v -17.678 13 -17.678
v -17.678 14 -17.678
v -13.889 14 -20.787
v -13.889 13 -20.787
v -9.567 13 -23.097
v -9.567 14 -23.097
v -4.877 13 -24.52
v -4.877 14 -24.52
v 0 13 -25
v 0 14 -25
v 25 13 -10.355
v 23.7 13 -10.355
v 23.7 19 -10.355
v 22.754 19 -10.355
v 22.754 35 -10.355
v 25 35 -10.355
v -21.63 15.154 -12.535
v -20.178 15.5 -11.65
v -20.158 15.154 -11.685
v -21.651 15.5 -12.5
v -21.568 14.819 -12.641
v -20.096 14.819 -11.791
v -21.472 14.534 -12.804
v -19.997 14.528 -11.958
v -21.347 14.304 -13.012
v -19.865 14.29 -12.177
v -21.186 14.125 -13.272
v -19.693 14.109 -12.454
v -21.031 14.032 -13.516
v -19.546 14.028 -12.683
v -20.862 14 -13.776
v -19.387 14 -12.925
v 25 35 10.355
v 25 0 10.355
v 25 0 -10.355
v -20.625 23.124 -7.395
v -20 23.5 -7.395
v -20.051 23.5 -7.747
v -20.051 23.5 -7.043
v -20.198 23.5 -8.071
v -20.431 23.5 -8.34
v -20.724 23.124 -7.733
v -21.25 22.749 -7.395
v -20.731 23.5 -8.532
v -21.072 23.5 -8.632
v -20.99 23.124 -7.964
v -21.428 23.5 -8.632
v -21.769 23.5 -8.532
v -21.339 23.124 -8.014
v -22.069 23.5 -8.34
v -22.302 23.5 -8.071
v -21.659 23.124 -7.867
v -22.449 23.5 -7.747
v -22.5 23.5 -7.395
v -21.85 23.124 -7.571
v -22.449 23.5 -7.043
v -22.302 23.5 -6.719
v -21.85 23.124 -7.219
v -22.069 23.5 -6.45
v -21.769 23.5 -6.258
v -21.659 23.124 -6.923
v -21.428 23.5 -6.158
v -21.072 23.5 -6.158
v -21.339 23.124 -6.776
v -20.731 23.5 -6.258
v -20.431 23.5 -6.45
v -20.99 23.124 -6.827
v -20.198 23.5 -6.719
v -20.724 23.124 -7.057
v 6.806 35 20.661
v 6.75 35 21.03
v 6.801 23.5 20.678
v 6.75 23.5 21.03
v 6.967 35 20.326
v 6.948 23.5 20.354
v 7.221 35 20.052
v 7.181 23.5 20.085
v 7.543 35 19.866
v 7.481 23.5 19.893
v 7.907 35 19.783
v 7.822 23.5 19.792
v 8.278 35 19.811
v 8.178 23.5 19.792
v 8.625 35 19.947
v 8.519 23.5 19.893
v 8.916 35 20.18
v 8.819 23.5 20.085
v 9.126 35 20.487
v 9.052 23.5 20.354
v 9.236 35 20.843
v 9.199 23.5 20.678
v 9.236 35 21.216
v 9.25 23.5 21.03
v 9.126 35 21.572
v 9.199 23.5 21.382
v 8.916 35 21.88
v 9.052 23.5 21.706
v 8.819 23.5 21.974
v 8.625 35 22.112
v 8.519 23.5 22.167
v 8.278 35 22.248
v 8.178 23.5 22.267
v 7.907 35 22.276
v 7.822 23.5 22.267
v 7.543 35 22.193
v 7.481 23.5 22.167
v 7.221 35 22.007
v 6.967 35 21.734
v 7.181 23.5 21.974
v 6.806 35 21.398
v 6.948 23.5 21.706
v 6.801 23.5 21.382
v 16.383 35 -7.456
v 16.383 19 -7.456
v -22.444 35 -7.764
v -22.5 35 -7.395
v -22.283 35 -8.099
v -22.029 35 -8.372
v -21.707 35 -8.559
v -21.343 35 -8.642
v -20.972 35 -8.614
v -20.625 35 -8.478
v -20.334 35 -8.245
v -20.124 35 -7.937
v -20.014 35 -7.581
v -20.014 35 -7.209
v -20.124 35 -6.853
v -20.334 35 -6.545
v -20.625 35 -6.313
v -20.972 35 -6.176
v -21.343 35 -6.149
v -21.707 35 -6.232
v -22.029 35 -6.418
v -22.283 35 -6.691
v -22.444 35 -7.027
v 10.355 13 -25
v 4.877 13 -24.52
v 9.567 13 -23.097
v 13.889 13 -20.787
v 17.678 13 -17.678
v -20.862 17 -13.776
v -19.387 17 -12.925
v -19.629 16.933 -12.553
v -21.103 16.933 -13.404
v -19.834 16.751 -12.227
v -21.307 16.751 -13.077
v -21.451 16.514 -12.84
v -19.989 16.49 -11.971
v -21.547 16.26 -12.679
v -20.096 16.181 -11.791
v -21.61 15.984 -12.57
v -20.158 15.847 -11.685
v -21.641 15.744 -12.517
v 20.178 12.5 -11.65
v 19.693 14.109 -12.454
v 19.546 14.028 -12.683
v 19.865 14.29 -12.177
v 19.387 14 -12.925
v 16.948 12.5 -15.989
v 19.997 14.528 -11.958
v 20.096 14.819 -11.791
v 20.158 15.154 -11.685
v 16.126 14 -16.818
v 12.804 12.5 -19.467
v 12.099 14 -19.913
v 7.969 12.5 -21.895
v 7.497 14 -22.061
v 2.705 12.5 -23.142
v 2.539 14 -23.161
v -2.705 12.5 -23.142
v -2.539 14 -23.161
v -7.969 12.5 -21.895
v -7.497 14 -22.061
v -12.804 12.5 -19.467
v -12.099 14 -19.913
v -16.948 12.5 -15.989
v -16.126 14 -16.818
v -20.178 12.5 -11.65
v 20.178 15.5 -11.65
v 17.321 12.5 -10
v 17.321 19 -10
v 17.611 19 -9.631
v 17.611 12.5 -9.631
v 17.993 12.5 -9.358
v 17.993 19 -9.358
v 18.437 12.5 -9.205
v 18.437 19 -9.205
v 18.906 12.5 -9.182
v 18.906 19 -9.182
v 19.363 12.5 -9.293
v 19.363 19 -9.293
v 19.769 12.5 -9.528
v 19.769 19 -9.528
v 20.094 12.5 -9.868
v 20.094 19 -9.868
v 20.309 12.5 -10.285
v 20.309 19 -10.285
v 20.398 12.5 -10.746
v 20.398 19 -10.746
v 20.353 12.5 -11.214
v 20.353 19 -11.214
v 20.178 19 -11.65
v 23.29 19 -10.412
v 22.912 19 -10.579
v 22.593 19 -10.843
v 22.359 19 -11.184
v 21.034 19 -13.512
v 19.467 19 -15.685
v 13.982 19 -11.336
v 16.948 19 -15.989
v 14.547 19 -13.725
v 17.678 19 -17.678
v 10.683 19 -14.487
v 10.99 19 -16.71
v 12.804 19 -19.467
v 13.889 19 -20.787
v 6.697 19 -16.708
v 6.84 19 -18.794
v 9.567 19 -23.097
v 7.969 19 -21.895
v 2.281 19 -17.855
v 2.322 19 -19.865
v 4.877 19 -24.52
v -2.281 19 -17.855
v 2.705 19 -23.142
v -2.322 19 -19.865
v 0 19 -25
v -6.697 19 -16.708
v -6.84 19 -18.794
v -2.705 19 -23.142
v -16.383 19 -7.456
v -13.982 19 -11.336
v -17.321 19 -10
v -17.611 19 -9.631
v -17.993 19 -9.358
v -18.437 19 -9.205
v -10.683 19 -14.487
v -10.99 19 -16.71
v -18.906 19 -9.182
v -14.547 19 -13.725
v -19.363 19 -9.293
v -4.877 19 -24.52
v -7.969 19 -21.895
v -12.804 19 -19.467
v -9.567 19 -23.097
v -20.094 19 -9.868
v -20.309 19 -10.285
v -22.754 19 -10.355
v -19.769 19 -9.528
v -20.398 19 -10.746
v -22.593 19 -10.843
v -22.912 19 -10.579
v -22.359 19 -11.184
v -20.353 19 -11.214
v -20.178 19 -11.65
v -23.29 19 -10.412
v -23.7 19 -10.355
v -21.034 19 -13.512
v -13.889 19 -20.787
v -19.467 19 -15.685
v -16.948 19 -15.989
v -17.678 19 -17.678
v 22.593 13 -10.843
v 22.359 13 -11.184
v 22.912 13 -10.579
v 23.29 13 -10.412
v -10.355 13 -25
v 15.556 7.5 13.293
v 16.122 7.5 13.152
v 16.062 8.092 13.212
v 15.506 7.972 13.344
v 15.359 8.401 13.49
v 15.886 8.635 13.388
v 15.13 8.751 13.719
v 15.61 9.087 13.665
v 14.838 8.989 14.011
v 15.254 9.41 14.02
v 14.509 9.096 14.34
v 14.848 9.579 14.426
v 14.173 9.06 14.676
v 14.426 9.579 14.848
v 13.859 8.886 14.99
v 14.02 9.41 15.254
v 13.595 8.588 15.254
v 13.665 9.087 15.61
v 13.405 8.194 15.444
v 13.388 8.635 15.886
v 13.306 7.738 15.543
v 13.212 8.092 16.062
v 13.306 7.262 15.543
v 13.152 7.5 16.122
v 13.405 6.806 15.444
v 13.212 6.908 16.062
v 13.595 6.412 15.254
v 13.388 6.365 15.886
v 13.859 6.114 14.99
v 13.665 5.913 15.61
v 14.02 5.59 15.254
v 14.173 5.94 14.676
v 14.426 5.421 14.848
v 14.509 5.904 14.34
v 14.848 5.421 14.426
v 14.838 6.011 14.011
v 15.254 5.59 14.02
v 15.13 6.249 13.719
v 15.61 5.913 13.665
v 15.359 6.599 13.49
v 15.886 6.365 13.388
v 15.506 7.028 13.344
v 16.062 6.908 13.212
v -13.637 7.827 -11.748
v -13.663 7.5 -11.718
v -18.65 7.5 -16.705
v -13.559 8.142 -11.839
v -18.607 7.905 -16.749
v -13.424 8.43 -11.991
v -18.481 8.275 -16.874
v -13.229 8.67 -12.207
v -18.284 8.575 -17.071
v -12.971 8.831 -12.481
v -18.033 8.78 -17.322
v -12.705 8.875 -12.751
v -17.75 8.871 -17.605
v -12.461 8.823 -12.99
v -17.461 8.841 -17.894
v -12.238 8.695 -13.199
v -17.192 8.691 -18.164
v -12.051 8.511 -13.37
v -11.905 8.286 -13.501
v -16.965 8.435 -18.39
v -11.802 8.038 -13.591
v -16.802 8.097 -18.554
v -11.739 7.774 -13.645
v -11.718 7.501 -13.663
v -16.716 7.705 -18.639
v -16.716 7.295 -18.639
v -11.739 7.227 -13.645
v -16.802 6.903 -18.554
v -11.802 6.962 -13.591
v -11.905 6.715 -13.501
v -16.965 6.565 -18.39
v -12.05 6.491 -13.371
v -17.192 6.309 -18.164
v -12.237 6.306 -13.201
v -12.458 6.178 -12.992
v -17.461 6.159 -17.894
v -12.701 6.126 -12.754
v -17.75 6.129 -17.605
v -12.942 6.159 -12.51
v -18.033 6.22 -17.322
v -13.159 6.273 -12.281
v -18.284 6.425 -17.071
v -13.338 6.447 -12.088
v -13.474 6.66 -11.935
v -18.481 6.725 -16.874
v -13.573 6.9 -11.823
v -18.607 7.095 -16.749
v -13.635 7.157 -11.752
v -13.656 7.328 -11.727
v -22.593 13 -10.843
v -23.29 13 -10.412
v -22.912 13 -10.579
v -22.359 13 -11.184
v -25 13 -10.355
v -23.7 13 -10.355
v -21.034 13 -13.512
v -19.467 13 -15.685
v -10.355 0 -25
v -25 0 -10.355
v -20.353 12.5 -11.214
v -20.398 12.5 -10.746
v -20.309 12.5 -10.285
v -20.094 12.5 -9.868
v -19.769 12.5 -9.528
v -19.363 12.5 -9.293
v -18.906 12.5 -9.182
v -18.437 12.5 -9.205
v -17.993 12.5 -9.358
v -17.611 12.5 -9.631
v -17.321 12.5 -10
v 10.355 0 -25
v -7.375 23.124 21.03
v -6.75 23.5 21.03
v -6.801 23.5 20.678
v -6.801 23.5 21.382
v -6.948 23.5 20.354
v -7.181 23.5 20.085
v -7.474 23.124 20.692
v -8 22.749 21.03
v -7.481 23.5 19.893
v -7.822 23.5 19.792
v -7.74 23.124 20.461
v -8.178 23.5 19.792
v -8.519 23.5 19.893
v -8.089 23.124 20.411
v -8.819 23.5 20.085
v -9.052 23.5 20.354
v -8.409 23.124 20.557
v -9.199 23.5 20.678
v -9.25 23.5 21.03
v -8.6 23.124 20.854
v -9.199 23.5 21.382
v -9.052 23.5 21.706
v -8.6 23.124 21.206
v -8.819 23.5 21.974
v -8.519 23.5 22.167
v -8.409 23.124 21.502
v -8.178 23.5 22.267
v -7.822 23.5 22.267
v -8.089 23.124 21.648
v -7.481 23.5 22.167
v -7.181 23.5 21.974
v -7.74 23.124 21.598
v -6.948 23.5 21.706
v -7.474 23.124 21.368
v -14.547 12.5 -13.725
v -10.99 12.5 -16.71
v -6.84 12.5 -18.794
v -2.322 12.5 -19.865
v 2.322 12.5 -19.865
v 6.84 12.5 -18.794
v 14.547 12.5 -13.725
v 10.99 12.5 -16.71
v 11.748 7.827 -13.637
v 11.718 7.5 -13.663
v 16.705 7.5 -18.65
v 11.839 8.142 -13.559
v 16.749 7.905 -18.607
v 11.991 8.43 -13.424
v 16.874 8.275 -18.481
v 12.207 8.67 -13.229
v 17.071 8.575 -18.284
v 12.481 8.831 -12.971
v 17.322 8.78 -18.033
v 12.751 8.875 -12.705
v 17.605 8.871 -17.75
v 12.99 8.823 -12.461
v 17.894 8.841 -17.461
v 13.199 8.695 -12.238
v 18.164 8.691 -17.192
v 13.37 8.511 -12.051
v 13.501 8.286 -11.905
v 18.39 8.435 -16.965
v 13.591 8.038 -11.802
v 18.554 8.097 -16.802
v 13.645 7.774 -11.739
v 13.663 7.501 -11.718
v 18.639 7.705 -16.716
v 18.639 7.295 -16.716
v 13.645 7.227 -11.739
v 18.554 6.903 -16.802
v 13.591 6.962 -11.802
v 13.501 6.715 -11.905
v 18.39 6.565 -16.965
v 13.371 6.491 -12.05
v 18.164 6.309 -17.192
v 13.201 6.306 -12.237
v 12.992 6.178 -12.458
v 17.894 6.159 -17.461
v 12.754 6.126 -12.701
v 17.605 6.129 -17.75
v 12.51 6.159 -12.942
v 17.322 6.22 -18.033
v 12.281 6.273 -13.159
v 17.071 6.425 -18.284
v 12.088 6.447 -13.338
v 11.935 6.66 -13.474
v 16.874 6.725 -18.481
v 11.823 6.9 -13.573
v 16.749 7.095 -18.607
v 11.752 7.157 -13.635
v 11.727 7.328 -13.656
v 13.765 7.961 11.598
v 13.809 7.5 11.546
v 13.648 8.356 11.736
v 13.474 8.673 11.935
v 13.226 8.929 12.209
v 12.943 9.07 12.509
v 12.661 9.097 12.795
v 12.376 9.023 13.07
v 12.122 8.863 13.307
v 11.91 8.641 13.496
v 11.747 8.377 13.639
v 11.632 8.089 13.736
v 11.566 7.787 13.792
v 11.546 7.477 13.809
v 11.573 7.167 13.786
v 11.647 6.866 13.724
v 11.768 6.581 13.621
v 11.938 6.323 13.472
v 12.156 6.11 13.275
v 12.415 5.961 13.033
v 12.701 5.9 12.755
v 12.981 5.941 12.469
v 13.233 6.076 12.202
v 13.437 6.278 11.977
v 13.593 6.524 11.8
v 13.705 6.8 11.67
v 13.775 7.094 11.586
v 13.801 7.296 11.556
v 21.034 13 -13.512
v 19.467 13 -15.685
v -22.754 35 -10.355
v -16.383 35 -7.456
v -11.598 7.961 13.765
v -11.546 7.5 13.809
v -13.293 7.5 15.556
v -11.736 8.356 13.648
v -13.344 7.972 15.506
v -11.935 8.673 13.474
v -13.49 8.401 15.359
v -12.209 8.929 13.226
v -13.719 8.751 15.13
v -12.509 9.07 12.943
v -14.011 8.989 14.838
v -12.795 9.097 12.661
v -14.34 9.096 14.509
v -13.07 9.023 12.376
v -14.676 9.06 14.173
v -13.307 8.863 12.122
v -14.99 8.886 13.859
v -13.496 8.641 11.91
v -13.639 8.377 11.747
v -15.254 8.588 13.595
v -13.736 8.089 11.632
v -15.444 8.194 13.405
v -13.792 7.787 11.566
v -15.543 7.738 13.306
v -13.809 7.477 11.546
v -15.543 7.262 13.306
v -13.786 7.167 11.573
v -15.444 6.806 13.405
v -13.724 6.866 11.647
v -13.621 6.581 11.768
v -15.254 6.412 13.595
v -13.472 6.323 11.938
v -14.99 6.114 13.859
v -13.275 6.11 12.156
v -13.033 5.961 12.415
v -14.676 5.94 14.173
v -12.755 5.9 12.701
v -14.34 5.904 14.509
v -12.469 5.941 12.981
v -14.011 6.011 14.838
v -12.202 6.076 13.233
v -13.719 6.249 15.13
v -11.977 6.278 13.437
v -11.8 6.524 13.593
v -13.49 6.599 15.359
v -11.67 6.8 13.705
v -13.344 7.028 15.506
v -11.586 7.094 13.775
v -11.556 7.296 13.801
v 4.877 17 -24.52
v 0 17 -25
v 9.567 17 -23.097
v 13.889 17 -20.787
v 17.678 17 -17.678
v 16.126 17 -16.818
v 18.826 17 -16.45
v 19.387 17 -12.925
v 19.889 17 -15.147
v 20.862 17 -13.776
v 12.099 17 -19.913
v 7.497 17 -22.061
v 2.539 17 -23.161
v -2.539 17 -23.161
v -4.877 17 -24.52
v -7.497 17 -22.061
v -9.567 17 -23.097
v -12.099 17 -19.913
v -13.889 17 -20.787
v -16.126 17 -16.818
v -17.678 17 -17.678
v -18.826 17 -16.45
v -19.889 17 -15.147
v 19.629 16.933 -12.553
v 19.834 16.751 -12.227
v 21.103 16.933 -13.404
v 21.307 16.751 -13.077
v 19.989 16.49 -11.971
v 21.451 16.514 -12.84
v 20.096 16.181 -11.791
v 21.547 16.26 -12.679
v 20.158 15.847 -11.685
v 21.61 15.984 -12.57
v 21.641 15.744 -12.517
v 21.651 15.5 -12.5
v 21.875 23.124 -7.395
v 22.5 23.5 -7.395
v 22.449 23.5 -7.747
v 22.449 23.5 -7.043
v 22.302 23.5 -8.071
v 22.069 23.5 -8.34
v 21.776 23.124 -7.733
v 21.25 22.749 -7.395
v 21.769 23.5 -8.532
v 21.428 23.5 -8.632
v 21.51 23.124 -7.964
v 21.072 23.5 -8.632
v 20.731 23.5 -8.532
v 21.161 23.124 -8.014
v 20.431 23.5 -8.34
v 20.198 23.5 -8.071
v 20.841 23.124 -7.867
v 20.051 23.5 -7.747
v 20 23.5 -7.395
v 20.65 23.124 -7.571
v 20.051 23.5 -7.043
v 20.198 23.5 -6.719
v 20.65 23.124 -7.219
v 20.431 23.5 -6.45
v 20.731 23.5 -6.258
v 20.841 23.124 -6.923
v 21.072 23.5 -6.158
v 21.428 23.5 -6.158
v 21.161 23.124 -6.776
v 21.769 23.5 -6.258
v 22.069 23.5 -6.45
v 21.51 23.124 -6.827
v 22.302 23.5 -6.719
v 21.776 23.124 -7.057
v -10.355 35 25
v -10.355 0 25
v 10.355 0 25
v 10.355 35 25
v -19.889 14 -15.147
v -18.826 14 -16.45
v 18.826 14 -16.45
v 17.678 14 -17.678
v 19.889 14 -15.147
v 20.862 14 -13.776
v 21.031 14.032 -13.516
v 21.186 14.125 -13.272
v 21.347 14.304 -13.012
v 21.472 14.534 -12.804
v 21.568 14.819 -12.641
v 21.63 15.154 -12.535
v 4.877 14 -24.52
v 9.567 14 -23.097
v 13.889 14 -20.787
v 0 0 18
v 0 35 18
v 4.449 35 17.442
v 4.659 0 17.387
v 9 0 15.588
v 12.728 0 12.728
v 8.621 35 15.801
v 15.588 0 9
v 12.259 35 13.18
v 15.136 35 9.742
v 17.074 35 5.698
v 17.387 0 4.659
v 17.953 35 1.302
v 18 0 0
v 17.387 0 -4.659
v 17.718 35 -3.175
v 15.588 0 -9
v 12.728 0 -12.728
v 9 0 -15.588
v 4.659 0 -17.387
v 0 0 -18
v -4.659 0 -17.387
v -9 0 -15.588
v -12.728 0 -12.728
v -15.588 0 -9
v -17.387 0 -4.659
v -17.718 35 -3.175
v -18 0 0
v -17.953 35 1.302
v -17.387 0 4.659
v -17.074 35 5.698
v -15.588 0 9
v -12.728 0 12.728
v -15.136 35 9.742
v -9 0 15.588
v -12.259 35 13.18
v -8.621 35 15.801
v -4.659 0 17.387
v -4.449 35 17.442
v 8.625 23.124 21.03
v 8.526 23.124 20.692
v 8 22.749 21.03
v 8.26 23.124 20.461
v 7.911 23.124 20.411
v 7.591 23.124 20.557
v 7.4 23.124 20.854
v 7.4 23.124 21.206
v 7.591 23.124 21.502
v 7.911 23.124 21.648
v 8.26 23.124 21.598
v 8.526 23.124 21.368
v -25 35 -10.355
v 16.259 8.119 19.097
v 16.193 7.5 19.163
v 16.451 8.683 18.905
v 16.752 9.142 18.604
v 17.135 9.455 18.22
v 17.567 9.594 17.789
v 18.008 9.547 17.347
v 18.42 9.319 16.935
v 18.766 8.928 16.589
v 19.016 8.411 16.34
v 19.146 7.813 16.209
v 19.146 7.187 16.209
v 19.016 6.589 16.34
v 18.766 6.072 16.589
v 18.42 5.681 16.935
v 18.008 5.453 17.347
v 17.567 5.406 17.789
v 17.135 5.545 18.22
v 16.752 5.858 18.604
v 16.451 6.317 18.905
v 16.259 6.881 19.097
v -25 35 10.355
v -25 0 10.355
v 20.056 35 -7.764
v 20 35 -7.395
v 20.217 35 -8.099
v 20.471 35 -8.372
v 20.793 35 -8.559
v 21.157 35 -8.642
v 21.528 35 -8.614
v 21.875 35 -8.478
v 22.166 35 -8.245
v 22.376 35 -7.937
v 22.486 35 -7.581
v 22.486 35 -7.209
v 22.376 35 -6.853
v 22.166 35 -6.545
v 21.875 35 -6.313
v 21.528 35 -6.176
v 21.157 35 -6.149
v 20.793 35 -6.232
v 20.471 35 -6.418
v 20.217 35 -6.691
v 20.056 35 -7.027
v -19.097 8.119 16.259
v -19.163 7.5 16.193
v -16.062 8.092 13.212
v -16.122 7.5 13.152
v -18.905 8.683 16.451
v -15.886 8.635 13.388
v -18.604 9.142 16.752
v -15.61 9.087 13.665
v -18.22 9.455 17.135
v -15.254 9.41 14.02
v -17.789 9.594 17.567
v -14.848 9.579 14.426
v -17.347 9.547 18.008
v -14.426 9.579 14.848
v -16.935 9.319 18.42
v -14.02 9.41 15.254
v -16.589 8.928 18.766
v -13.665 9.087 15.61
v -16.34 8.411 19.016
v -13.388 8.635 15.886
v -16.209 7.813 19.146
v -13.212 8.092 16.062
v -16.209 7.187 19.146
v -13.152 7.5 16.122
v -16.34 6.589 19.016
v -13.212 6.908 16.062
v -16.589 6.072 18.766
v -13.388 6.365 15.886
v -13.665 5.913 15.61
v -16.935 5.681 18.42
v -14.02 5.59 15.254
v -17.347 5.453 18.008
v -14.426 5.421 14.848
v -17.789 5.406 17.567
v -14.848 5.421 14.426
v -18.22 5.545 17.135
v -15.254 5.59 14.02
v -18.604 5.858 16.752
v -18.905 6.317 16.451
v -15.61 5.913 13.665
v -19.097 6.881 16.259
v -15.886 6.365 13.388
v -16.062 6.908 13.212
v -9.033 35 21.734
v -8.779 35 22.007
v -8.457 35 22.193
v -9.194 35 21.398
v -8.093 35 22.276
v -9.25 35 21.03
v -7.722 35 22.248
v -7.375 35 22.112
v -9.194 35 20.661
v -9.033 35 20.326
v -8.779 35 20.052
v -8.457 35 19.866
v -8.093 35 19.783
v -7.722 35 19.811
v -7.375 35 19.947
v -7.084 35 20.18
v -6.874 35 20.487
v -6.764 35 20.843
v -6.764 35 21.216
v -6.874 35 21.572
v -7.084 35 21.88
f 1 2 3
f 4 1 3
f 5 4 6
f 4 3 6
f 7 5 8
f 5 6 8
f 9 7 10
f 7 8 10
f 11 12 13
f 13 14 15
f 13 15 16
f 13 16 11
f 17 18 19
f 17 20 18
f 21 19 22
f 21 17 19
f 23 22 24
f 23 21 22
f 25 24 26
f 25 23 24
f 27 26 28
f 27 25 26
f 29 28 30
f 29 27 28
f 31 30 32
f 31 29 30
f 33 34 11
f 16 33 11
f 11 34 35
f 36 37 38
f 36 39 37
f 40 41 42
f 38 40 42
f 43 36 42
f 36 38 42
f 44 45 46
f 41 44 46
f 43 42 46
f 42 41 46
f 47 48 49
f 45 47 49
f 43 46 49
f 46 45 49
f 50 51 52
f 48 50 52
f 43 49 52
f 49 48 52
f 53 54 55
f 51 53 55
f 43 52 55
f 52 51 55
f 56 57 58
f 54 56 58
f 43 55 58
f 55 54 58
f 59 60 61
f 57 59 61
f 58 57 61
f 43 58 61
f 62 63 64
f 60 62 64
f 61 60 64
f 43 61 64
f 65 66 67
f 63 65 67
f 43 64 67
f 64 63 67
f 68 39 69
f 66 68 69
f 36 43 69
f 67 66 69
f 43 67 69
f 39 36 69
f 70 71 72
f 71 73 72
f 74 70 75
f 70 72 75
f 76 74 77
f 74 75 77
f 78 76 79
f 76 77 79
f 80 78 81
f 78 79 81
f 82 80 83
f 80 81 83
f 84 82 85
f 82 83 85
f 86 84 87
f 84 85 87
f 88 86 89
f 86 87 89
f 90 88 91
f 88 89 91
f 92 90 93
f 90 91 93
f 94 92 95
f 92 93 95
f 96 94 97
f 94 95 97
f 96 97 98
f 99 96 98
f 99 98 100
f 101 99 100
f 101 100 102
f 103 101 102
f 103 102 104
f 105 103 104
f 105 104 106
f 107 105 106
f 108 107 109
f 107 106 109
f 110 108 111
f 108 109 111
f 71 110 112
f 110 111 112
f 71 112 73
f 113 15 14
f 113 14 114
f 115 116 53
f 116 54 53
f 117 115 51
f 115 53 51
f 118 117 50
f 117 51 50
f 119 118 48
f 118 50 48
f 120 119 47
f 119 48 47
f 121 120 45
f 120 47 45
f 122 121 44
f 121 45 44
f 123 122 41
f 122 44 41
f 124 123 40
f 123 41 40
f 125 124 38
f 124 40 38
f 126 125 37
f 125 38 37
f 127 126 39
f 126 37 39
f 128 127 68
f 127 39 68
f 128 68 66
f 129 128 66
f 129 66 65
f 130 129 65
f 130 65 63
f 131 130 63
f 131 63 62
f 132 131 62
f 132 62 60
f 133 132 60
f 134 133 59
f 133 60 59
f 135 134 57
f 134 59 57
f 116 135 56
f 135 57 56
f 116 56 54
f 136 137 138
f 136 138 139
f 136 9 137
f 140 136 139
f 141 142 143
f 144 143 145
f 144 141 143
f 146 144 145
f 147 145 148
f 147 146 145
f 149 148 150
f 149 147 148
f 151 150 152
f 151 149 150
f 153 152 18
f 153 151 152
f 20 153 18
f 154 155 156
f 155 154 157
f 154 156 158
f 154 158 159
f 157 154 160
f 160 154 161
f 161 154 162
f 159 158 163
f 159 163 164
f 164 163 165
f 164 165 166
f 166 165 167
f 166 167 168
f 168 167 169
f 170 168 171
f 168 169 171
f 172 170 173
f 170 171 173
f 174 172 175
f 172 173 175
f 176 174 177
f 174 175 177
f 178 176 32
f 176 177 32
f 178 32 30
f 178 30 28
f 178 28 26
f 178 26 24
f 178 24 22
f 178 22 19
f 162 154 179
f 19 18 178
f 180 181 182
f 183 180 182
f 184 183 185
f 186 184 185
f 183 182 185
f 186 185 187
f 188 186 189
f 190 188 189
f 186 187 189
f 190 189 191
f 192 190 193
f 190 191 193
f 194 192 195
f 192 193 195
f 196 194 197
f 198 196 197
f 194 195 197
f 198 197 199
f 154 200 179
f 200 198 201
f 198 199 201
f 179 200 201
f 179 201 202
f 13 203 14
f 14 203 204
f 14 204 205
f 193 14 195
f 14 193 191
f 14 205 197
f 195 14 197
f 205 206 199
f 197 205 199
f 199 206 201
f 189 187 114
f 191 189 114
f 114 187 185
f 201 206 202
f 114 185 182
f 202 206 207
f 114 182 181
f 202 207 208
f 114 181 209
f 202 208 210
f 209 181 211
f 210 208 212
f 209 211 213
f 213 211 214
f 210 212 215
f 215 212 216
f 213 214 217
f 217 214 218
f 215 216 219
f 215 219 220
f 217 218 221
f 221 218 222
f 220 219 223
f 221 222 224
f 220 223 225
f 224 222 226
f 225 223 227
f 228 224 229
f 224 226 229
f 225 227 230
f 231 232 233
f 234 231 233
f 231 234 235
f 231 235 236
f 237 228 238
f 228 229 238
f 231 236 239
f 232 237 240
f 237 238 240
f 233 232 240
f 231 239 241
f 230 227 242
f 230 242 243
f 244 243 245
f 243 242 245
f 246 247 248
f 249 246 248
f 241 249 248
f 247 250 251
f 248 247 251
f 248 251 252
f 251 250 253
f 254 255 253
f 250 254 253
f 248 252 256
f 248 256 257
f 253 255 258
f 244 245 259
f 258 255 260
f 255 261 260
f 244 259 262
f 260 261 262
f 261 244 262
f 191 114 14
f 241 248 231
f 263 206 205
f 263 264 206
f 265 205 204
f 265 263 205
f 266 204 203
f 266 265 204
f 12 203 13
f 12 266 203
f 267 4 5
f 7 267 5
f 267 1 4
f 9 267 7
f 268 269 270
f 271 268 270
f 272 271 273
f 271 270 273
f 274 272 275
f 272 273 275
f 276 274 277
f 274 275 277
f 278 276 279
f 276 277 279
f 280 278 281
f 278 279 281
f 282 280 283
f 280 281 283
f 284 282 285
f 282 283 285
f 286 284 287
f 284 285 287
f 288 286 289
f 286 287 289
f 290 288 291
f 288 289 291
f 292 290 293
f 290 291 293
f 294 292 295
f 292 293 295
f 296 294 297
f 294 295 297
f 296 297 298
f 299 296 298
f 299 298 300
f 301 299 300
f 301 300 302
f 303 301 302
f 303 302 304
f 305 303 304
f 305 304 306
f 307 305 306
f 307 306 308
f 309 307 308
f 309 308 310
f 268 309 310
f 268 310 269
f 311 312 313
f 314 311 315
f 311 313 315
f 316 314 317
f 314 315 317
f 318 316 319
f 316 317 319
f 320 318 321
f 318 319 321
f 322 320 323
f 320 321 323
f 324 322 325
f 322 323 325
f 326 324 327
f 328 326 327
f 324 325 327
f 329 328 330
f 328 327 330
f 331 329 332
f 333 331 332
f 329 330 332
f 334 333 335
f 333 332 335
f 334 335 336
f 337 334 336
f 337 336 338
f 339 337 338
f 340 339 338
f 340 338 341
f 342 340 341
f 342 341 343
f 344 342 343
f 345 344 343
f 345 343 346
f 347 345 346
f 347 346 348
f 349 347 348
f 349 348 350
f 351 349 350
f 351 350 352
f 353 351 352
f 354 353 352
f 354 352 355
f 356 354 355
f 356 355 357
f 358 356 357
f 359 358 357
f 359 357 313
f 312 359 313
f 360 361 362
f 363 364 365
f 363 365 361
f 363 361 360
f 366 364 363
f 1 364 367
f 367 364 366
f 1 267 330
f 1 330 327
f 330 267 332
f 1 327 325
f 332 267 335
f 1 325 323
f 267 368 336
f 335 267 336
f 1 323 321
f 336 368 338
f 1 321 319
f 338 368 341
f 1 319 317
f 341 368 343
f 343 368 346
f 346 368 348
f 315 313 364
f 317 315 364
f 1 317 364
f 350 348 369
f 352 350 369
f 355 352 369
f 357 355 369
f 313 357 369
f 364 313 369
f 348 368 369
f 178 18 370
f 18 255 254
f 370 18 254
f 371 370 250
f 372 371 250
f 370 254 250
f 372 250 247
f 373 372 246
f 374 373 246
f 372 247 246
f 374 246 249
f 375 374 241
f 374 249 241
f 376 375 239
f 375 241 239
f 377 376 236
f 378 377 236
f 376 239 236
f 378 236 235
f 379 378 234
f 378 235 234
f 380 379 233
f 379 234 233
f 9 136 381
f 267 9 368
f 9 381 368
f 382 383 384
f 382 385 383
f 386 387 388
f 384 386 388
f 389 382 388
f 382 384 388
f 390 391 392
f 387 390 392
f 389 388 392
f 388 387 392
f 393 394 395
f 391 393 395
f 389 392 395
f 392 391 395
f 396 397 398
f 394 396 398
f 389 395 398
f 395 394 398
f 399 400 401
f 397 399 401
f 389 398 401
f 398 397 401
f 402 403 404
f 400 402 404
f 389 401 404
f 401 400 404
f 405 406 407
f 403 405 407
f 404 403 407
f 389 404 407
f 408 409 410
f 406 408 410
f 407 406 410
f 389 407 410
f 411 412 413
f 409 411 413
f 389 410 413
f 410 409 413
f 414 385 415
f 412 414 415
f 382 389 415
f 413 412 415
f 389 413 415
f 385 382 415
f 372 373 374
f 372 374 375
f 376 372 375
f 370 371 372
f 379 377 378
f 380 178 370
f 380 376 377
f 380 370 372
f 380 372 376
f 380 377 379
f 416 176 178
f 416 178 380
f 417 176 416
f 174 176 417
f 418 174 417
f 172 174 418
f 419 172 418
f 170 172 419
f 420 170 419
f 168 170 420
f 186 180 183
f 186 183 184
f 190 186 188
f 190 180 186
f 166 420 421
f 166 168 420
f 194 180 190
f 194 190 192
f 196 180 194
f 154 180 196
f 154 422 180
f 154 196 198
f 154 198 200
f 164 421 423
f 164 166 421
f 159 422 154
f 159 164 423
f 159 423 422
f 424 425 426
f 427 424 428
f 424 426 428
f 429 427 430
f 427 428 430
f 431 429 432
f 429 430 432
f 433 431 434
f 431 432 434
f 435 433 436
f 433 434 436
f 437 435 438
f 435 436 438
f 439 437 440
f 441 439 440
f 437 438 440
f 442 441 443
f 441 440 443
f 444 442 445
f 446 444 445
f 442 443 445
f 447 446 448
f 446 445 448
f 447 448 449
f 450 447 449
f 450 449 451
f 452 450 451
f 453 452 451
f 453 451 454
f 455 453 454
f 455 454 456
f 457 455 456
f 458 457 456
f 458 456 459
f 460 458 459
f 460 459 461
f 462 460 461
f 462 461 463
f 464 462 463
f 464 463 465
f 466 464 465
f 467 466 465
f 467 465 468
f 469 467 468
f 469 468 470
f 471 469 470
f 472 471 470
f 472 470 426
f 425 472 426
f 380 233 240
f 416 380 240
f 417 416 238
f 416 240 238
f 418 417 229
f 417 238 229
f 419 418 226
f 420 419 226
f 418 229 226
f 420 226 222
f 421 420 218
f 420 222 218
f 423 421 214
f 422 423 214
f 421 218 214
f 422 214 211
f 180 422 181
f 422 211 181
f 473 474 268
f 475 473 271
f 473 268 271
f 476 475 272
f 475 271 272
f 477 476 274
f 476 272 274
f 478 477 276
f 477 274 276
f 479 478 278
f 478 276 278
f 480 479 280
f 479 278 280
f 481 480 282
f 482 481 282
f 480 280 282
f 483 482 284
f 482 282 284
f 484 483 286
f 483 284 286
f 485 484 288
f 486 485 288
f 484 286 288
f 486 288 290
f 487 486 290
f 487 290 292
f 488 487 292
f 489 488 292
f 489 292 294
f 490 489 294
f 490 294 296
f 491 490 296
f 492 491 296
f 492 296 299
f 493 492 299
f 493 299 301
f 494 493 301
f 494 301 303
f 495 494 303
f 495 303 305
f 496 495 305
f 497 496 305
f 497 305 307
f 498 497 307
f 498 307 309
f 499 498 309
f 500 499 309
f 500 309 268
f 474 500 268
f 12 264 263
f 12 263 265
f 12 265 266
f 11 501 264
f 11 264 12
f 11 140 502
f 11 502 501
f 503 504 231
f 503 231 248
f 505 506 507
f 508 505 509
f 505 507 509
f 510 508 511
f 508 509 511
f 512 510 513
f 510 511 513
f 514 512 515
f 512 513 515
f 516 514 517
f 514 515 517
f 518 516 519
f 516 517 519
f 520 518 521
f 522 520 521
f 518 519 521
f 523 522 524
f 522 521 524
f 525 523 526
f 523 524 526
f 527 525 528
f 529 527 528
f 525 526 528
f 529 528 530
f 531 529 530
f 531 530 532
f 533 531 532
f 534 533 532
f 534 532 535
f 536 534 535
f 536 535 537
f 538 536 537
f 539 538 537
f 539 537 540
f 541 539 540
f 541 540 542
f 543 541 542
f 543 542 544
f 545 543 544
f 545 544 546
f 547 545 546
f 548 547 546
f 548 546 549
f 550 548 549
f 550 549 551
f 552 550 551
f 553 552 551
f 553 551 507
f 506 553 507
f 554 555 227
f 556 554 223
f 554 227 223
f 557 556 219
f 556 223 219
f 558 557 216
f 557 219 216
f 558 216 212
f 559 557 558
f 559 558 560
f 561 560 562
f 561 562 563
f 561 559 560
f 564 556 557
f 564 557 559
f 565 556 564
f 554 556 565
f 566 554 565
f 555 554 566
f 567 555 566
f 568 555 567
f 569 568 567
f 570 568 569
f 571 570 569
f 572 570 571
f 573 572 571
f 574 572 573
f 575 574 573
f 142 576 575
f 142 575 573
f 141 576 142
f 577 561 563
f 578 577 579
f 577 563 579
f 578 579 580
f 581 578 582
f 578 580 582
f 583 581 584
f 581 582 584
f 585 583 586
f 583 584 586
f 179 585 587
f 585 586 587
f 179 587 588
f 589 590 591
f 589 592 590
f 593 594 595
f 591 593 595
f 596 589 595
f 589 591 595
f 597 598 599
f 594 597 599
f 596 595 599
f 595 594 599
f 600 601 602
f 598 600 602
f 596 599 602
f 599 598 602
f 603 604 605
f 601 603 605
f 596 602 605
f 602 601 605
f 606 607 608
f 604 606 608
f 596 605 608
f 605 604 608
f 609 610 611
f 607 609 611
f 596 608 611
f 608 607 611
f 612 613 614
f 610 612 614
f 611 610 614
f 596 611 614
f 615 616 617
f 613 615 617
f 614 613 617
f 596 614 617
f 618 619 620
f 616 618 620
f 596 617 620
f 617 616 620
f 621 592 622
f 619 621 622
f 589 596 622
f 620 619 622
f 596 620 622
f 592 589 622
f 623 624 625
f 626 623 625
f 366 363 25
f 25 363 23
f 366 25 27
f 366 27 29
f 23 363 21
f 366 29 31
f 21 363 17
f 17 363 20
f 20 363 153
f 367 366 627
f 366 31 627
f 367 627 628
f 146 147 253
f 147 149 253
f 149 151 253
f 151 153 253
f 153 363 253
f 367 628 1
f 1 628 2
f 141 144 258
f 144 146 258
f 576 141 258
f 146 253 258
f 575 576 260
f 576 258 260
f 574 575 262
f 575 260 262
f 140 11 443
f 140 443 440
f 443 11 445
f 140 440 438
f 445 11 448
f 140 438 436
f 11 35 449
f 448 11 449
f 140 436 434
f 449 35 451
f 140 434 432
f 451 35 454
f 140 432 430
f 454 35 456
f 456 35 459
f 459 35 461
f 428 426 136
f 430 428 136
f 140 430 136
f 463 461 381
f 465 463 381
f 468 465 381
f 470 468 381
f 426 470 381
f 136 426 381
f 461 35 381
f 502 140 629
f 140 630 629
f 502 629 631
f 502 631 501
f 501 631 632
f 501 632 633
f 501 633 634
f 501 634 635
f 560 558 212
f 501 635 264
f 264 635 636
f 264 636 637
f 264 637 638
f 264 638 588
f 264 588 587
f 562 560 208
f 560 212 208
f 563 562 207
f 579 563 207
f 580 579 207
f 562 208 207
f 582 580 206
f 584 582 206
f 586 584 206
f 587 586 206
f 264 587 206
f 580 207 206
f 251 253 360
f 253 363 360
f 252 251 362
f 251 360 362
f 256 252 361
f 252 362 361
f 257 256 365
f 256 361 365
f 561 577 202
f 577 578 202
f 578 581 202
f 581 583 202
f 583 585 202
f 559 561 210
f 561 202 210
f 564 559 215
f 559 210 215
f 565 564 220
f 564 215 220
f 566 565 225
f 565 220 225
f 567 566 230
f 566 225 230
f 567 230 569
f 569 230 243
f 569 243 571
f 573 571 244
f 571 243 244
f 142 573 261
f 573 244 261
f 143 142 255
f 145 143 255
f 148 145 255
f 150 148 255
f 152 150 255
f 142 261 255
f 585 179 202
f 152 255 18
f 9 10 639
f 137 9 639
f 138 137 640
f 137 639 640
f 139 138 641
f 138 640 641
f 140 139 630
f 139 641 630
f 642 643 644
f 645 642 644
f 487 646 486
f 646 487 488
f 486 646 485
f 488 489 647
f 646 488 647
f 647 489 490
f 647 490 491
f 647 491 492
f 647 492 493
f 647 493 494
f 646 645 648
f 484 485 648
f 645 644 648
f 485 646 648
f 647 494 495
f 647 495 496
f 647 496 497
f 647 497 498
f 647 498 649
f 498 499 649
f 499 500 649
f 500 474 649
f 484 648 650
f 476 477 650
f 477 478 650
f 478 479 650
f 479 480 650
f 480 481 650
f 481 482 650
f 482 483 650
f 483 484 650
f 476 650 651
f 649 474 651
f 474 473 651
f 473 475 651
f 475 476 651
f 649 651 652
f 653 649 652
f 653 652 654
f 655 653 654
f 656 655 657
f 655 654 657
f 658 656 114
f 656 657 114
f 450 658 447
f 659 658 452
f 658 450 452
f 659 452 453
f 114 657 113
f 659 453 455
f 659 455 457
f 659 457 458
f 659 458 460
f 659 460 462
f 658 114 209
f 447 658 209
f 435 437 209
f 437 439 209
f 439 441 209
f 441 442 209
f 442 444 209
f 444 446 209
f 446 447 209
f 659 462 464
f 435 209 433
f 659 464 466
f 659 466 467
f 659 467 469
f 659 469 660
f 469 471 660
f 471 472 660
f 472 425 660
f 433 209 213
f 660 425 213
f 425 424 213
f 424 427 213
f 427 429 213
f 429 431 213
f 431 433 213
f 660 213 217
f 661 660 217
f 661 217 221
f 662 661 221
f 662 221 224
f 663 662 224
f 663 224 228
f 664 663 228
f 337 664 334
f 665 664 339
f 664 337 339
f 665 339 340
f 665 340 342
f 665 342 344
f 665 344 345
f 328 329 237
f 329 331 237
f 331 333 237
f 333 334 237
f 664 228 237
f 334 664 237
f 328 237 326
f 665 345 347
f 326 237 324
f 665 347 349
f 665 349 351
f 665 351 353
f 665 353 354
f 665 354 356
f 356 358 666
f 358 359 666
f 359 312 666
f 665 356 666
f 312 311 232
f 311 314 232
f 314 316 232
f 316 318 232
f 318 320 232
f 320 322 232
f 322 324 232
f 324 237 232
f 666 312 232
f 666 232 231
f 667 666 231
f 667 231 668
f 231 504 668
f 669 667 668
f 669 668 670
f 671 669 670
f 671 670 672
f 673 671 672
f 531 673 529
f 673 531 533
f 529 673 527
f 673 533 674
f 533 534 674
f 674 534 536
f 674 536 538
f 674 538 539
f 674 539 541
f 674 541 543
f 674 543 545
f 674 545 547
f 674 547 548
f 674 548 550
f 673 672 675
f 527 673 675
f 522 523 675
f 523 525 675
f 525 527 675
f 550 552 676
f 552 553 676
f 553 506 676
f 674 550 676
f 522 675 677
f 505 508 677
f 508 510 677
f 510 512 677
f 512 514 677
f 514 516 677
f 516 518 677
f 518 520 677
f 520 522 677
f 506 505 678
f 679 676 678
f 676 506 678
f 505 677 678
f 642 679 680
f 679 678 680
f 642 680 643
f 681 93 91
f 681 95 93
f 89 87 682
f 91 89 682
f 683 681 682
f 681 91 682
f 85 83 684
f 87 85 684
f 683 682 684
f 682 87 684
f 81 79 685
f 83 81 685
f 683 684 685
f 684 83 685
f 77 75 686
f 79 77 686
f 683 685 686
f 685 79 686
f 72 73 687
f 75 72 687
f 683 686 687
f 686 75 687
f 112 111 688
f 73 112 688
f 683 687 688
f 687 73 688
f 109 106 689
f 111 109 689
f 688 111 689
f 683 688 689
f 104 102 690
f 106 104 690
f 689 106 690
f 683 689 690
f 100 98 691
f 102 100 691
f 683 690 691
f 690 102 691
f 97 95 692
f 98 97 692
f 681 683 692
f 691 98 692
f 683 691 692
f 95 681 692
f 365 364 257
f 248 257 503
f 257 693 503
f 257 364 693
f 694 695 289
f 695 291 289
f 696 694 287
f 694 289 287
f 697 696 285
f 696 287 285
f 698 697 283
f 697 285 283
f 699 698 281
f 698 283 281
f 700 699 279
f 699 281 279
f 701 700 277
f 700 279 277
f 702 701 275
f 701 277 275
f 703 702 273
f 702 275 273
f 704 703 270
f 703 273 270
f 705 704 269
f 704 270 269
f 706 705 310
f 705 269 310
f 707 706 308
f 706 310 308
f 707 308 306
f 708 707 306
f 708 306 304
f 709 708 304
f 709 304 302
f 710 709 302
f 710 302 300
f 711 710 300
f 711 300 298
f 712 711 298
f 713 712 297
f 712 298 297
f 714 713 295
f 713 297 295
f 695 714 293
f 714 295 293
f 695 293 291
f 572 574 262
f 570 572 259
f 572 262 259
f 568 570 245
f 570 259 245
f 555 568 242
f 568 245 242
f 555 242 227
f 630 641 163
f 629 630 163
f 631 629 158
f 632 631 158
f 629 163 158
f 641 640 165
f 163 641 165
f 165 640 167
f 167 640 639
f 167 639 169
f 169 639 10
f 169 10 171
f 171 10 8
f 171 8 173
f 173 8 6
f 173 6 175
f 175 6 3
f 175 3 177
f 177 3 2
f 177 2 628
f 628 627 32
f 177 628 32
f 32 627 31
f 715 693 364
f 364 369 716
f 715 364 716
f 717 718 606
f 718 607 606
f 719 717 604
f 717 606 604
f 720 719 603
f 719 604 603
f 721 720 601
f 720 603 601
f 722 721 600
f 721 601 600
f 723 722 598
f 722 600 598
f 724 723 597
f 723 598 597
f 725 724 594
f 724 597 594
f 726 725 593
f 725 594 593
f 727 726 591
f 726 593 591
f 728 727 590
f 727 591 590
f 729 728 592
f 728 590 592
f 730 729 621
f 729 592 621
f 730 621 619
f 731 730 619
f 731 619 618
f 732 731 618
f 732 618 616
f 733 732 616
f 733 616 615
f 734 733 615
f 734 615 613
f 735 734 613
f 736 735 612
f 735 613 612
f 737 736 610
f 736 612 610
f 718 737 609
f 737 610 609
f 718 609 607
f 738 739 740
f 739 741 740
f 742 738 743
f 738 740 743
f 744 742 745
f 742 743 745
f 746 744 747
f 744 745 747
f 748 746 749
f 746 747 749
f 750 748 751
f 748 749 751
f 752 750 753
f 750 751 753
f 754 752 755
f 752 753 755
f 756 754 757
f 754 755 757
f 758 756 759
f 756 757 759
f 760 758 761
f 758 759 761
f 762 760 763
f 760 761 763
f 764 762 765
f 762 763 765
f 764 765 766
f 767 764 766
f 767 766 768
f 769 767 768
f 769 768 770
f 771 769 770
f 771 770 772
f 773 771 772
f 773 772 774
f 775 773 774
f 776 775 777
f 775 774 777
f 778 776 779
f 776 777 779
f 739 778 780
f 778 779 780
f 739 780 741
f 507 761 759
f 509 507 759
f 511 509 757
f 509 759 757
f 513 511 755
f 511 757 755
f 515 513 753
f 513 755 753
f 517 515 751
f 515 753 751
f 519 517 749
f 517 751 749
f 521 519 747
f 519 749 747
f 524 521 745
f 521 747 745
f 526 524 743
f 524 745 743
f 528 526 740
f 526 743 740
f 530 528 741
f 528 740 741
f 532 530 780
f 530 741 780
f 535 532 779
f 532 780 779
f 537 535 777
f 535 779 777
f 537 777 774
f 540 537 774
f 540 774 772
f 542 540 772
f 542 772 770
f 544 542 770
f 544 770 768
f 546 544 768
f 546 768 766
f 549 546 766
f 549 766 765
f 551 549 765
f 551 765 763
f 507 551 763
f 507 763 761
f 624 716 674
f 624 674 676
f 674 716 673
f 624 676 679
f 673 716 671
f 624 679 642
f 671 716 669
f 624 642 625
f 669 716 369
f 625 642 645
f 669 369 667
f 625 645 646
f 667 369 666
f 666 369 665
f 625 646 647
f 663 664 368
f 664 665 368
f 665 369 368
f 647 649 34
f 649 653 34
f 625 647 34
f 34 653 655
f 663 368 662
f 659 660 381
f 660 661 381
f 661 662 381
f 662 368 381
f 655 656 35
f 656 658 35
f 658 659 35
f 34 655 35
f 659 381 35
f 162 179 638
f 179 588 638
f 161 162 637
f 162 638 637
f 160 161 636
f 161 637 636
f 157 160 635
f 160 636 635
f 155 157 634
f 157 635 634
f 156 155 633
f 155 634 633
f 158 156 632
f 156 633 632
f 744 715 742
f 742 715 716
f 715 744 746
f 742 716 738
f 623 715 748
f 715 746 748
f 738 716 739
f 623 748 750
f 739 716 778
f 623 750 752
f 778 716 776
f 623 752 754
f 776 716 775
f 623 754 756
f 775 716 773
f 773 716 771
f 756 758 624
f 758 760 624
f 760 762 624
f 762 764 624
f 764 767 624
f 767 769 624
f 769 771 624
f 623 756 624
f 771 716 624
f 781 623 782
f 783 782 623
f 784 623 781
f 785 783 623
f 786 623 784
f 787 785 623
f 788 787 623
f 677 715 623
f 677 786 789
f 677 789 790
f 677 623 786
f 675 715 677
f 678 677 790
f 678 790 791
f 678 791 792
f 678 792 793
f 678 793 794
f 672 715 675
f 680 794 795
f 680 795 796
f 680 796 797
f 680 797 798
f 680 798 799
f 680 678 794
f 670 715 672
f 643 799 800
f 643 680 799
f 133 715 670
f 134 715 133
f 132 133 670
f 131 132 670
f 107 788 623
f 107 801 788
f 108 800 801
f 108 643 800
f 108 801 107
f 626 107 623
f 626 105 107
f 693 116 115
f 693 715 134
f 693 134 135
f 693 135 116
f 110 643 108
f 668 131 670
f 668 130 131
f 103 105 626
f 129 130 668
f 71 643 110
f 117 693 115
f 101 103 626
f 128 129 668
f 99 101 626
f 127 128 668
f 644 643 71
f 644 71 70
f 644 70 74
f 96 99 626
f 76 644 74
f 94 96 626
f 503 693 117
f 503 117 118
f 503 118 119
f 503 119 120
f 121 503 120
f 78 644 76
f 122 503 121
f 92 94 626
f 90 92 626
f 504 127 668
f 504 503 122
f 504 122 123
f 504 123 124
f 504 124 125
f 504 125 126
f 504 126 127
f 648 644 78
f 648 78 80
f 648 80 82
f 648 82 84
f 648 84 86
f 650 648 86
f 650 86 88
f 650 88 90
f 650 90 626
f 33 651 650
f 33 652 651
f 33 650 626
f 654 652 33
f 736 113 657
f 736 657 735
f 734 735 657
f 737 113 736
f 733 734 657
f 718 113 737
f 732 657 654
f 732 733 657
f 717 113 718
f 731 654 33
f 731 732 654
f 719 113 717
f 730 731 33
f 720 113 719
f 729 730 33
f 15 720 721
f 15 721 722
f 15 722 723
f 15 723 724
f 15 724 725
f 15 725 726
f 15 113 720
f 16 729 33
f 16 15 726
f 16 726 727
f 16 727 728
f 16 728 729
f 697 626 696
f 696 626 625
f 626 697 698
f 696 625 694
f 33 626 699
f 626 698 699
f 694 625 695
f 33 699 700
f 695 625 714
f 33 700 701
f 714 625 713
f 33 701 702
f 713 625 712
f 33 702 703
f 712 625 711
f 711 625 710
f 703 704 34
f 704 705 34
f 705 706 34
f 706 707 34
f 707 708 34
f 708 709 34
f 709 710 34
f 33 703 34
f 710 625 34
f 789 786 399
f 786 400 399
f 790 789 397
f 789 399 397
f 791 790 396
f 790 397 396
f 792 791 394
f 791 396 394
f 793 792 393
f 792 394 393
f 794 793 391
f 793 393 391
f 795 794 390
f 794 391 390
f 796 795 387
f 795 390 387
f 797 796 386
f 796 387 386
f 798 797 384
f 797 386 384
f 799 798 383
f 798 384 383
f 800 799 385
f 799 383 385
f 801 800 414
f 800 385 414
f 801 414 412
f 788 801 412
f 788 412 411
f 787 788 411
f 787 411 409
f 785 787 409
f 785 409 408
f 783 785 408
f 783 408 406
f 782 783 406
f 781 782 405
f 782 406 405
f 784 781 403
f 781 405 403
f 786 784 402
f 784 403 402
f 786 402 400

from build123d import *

# Parameters (mm, degrees)
BOSS_EXTRUDE1_DEPTH         = 35
CUT_EXTRUDE1_REACH          = 51.749
SKETCH2_R                   = 18
CUT_EXTRUDE2_DEPTH          = 22
CUT_EXTRUDE3_DEPTH          = 16
SKETCH5_W                   = 4.5
SKETCH5_H                   = 3
CUT_REVOLVE1_ANGLE          = 120
FILLET2_R                   = 1.5
CUT_EXTRUDE7_DEPTH          = 6.5
M3X0_25_TAPPED_HOLE1_REACH  = 71.769
M3X0_25_TAPPED_HOLE1_BORE_R = 1.375
M3X0_25_TAPPED_HOLE2_REACH  = 71.769
M3X0_25_TAPPED_HOLE2_BORE_R = 1.375
CUT_EXTRUDE8_REACH          = 71.769
CUT_EXTRUDE8_END_RADIUS     = 18
SKETCH15_R                  = 1.6
CUT_EXTRUDE9_REACH          = 71.769
CUT_EXTRUDE9_END_RADIUS     = 18
SKETCH16_R                  = 1.6
M5_TAPPED_HOLE3_D           = 4.2
M5_TAPPED_HOLE3_DEPTH       = 4.3
M5_TAPPED_HOLE3_TIP         = 1.2618073
M5_TAPPED_HOLE4_D           = 4.2
M5_TAPPED_HOLE4_DEPTH       = 4.3
M5_TAPPED_HOLE4_TIP         = 1.2618073
M3_TAPPED_HOLE1_D           = 2.5
M3_TAPPED_HOLE1_DEPTH       = 11.5
M3_TAPPED_HOLE1_TIP         = 0.751075774
FILLET3_R                   = 1.5


with BuildPart() as part:
    # Sketch1 → Boss-Extrude1 (new body)
    with BuildSketch(Plane(origin=(0, 0, 0), x_dir=(1, 0, 0), z_dir=(0, 1, 0))):
        Polygon((10.355339059, 25), (-10.355339059, 25), (-25, 10.355339059), (-25, -10.355339059), (-10.355339059, -25), (10.355339059, -25), (25, -10.355339059), (25, 10.355339059), align=None)
    extrude(amount=BOSS_EXTRUDE1_DEPTH)

    # Sketch2 → Cut-Extrude1 (cut, up to next)
    with BuildSketch(Plane(origin=(0, 35, 0), x_dir=(1, 0, 0), z_dir=(0, 1, 0)), mode=Mode.PRIVATE) as cut_extrude1_sk1:
        with Locations(Location((0, 0, 0), (0, 0, 270))):
            Circle(SKETCH2_R)
    cut_extrude1_tool1 = extrude(cut_extrude1_sk1.sketch, amount=-CUT_EXTRUDE1_REACH, mode=Mode.PRIVATE) & part.part
    add(cut_extrude1_tool1.solids().sort_by_distance((0, 35, 0))[0], mode=Mode.SUBTRACT)

    # Sketch3 → Cut-Extrude2 (cut)
    with BuildSketch(Plane(origin=(0, 35, 0), x_dir=(1, 0, 0), z_dir=(0, 1, 0))):
        with BuildLine():
            Line((-10.355339059, 25), (-17.677669284, 17.677669776))
            ThreePointArc((-17.677669284, 17.677669776), (-9.567085631, 23.096988387), (3.8e-08, 25))
            Line((3.8e-08, 25), (-10.355339059, 25))
        make_face()
        with BuildLine():
            Line((-17.677669284, 17.677669776), (-25, 10.355339059))
            Line((-25, 10.355339059), (-22.754493028, 10.355339059))
            ThreePointArc((-22.754493028, 10.355339059), (-20.544928062, 14.244505289), (-17.677669284, 17.677669776))
        make_face()
        with BuildLine():
            Line((10.355339059, 25), (3.8e-08, 25))
            ThreePointArc((3.8e-08, 25), (9.56708591, 23.096988271), (17.677669657, 17.677669402))
            Line((17.677669657, 17.677669402), (10.355339059, 25))
        make_face()
        with BuildLine():
            Line((25, 10.355339059), (17.677669657, 17.677669402))
            ThreePointArc((17.677669657, 17.677669402), (20.544928213, 14.244505072), (22.754493028, 10.355339059))
            Line((22.754493028, 10.355339059), (25, 10.355339059))
        make_face()
    extrude(amount=-CUT_EXTRUDE2_DEPTH, mode=Mode.SUBTRACT)

    # Sketch4 → Cut-Extrude3 (cut)
    with BuildSketch(Plane(origin=(0, 35, 0), x_dir=(1, 0, 0), z_dir=(0, 1, 0))):
        with BuildLine():
            Line((-16.38323498, 7.455844123), (-22.754493028, 10.355339059))
            ThreePointArc((-22.754493028, 10.355339059), (0, 25), (22.754493028, 10.355339059))
            Line((22.754493028, 10.355339059), (16.38323498, 7.455844123))
            ThreePointArc((16.38323498, 7.455844123), (0, 18), (-16.38323498, 7.455844123))
        make_face()
    extrude(amount=-CUT_EXTRUDE3_DEPTH, mode=Mode.SUBTRACT)

    # Sketch5 → Cut-Revolve1 (revolve, symmetric, cut)
    with BuildSketch(Plane(origin=(0, 0, 0), x_dir=(0, 0, -1), z_dir=(1, 0, 0))) as cut_revolve1_sk:
        with Locations((22.75, 15.5)):
            Rectangle(SKETCH5_W, SKETCH5_H)
    revolve(axis=Axis((0, 0, 0), (0, 1, 0)), revolution_arc=CUT_REVOLVE1_ANGLE / 2, mode=Mode.SUBTRACT)
    revolve(cut_revolve1_sk.sketch, axis=Axis((0, 0, 0), (0, -1, 0)), revolution_arc=CUT_REVOLVE1_ANGLE / 2, mode=Mode.SUBTRACT)

    # Fillet2
    fillet2_edges = [part.edges().sort_by_distance(p)[0] for p in [
        (19.702077936, 14, -11.375),
        (19.702077936, 17, -11.375),
        (-19.702077936, 17, -11.375),
        (-19.702077936, 14, -11.375),
    ]]
    fillet(fillet2_edges, radius=FILLET2_R - 0.0001)  # a hair under: the kernel refuses the full size

    # Sketch9 → Cut-Extrude7 (cut)
    with BuildSketch(Plane(origin=(0, 19, 0), x_dir=(1, 0, 0), z_dir=(0, 1, 0))):
        with BuildLine():
            ThreePointArc((20.178391908, 11.65), (0, 23.3), (-20.178391908, 11.65))
            ThreePointArc((-20.178391908, 11.65), (-19.574449992, 9.396058084), (-17.320508076, 10))
            ThreePointArc((-17.320508076, 10), (0, 20), (17.320508076, 10))
            ThreePointArc((17.320508076, 10), (19.574449992, 9.396058084), (20.178391908, 11.65))
        make_face()
    extrude(amount=-CUT_EXTRUDE7_DEPTH, mode=Mode.SUBTRACT)

    # M3x0.25 Tapped Hole1 bore → M3x0.25 Tapped Hole1 (cut, up to next)
    with BuildSketch(Plane(origin=(-17.67766953, 0, -17.67766953), x_dir=(-0.7071067811865472, 0, 0.7071067811865479), z_dir=(-0.7071067811865479, 0, -0.7071067811865472)), mode=Mode.PRIVATE) as m3x0_25_tapped_hole1_sk1:
        with Locations((0, 7.5)):
            Circle(M3X0_25_TAPPED_HOLE1_BORE_R)
    m3x0_25_tapped_hole1_tool1 = extrude(m3x0_25_tapped_hole1_sk1.sketch, amount=-M3X0_25_TAPPED_HOLE1_REACH, mode=Mode.PRIVATE) & part.part
    add(m3x0_25_tapped_hole1_tool1.solids().sort_by_distance((-17.67767, 7.5, -17.67767))[0], mode=Mode.SUBTRACT)

    # M3x0.25 Tapped Hole2 bore → M3x0.25 Tapped Hole2 (cut, up to next)
    with BuildSketch(Plane(origin=(17.67766953, 0, -17.67766953), x_dir=(-0.7071067811865475, 0, -0.7071067811865477), z_dir=(0.7071067811865477, 0, -0.7071067811865475)), mode=Mode.PRIVATE) as m3x0_25_tapped_hole2_sk1:
        with Locations((0, 7.5)):
            Circle(M3X0_25_TAPPED_HOLE2_BORE_R)
    m3x0_25_tapped_hole2_tool1 = extrude(m3x0_25_tapped_hole2_sk1.sketch, amount=-M3X0_25_TAPPED_HOLE2_REACH, mode=Mode.PRIVATE) & part.part
    add(m3x0_25_tapped_hole2_tool1.solids().sort_by_distance((17.67767, 7.5, -17.67767))[0], mode=Mode.SUBTRACT)

    # Cut-Extrude8: up to this cylinder (the profile starts outside it)
    cut_extrude8_end = Plane(origin=(0, 7.5, 0), z_dir=(0, 1, 0)) * Cylinder(CUT_EXTRUDE8_END_RADIUS, 180.538, mode=Mode.PRIVATE)
    # Sketch15 → Cut-Extrude8 (cut, up to the surface)
    with BuildSketch(Plane(origin=(17.67766953, 0, 17.67766953), x_dir=(0.7071067811865472, 0, -0.7071067811865479), z_dir=(0.7071067811865479, 0, 0.7071067811865472)), mode=Mode.PRIVATE) as cut_extrude8_sk1:
        with Locations((0, 7.5)):
            Circle(SKETCH15_R)
    cut_extrude8_tool1 = extrude(cut_extrude8_sk1.sketch, amount=-CUT_EXTRUDE8_REACH, mode=Mode.PRIVATE) - cut_extrude8_end
    add(cut_extrude8_tool1.solids().sort_by_distance((17.67767, 7.5, 17.67767))[0], mode=Mode.SUBTRACT)

    # Cut-Extrude9: up to this cylinder (the profile starts outside it)
    cut_extrude9_end = Plane(origin=(0, 7.5, 0), z_dir=(0, 1, 0)) * Cylinder(CUT_EXTRUDE9_END_RADIUS, 180.538, mode=Mode.PRIVATE)
    # Sketch16 → Cut-Extrude9 (cut, up to the surface)
    with BuildSketch(Plane(origin=(-17.67766953, 0, 17.67766953), x_dir=(0.7071067811865477, 0, 0.7071067811865475), z_dir=(-0.7071067811865475, 0, 0.7071067811865477)), mode=Mode.PRIVATE) as cut_extrude9_sk1:
        with Locations((0, 7.5)):
            Circle(SKETCH16_R)
    cut_extrude9_tool1 = extrude(cut_extrude9_sk1.sketch, amount=-CUT_EXTRUDE9_REACH, mode=Mode.PRIVATE) - cut_extrude9_end
    add(cut_extrude9_tool1.solids().sort_by_distance((-17.67767, 7.5, 17.67767))[0], mode=Mode.SUBTRACT)

    # M5 Tapped Hole3
    with Locations(Plane(origin=(-17.67766953, 0, 17.67766953), x_dir=(0.7071067811865477, 0, 0.7071067811865475), z_dir=(-0.7071067811865475, 0, 0.7071067811865477))):
        with Locations((0, 7.5)):
            Hole(M5_TAPPED_HOLE3_D / 2, depth=M5_TAPPED_HOLE3_DEPTH)
            with Locations((0, 0, -(M5_TAPPED_HOLE3_DEPTH + M5_TAPPED_HOLE3_TIP / 2))):  # 118° drill point
                Cone(0, M5_TAPPED_HOLE3_D / 2, M5_TAPPED_HOLE3_TIP, mode=Mode.SUBTRACT)

    # M5 Tapped Hole4
    with Locations(Plane(origin=(17.67766953, 0, 17.67766953), x_dir=(0.7071067811865472, 0, -0.7071067811865479), z_dir=(0.7071067811865479, 0, 0.7071067811865472))):
        with Locations((0, 7.5)):
            Hole(M5_TAPPED_HOLE4_D / 2, depth=M5_TAPPED_HOLE4_DEPTH)
            with Locations((0, 0, -(M5_TAPPED_HOLE4_DEPTH + M5_TAPPED_HOLE4_TIP / 2))):  # 118° drill point
                Cone(0, M5_TAPPED_HOLE4_D / 2, M5_TAPPED_HOLE4_TIP, mode=Mode.SUBTRACT)

    # M3 Tapped Hole1
    with Locations(Plane(origin=(0, 35, 0), x_dir=(1, 0, 0), z_dir=(0, 1, 0))):
        with Locations((-21.25, 7.395099729), (21.25, 7.395099729), (-8, -21.029740845), (8, -21.029740845)):
            Hole(M3_TAPPED_HOLE1_D / 2, depth=M3_TAPPED_HOLE1_DEPTH)
            with Locations((0, 0, -(M3_TAPPED_HOLE1_DEPTH + M3_TAPPED_HOLE1_TIP / 2))):  # 118° drill point
                Cone(0, M3_TAPPED_HOLE1_D / 2, M3_TAPPED_HOLE1_TIP, mode=Mode.SUBTRACT)

    # Fillet3
    fillet3_edges = [part.edges().sort_by_distance(p)[0] for p in [
        (22.754493028, 16, -10.355339059),
        (-22.754493028, 16, -10.355339059),
    ]]
    fillet(fillet3_edges, radius=FILLET3_R)


solid = part.part
